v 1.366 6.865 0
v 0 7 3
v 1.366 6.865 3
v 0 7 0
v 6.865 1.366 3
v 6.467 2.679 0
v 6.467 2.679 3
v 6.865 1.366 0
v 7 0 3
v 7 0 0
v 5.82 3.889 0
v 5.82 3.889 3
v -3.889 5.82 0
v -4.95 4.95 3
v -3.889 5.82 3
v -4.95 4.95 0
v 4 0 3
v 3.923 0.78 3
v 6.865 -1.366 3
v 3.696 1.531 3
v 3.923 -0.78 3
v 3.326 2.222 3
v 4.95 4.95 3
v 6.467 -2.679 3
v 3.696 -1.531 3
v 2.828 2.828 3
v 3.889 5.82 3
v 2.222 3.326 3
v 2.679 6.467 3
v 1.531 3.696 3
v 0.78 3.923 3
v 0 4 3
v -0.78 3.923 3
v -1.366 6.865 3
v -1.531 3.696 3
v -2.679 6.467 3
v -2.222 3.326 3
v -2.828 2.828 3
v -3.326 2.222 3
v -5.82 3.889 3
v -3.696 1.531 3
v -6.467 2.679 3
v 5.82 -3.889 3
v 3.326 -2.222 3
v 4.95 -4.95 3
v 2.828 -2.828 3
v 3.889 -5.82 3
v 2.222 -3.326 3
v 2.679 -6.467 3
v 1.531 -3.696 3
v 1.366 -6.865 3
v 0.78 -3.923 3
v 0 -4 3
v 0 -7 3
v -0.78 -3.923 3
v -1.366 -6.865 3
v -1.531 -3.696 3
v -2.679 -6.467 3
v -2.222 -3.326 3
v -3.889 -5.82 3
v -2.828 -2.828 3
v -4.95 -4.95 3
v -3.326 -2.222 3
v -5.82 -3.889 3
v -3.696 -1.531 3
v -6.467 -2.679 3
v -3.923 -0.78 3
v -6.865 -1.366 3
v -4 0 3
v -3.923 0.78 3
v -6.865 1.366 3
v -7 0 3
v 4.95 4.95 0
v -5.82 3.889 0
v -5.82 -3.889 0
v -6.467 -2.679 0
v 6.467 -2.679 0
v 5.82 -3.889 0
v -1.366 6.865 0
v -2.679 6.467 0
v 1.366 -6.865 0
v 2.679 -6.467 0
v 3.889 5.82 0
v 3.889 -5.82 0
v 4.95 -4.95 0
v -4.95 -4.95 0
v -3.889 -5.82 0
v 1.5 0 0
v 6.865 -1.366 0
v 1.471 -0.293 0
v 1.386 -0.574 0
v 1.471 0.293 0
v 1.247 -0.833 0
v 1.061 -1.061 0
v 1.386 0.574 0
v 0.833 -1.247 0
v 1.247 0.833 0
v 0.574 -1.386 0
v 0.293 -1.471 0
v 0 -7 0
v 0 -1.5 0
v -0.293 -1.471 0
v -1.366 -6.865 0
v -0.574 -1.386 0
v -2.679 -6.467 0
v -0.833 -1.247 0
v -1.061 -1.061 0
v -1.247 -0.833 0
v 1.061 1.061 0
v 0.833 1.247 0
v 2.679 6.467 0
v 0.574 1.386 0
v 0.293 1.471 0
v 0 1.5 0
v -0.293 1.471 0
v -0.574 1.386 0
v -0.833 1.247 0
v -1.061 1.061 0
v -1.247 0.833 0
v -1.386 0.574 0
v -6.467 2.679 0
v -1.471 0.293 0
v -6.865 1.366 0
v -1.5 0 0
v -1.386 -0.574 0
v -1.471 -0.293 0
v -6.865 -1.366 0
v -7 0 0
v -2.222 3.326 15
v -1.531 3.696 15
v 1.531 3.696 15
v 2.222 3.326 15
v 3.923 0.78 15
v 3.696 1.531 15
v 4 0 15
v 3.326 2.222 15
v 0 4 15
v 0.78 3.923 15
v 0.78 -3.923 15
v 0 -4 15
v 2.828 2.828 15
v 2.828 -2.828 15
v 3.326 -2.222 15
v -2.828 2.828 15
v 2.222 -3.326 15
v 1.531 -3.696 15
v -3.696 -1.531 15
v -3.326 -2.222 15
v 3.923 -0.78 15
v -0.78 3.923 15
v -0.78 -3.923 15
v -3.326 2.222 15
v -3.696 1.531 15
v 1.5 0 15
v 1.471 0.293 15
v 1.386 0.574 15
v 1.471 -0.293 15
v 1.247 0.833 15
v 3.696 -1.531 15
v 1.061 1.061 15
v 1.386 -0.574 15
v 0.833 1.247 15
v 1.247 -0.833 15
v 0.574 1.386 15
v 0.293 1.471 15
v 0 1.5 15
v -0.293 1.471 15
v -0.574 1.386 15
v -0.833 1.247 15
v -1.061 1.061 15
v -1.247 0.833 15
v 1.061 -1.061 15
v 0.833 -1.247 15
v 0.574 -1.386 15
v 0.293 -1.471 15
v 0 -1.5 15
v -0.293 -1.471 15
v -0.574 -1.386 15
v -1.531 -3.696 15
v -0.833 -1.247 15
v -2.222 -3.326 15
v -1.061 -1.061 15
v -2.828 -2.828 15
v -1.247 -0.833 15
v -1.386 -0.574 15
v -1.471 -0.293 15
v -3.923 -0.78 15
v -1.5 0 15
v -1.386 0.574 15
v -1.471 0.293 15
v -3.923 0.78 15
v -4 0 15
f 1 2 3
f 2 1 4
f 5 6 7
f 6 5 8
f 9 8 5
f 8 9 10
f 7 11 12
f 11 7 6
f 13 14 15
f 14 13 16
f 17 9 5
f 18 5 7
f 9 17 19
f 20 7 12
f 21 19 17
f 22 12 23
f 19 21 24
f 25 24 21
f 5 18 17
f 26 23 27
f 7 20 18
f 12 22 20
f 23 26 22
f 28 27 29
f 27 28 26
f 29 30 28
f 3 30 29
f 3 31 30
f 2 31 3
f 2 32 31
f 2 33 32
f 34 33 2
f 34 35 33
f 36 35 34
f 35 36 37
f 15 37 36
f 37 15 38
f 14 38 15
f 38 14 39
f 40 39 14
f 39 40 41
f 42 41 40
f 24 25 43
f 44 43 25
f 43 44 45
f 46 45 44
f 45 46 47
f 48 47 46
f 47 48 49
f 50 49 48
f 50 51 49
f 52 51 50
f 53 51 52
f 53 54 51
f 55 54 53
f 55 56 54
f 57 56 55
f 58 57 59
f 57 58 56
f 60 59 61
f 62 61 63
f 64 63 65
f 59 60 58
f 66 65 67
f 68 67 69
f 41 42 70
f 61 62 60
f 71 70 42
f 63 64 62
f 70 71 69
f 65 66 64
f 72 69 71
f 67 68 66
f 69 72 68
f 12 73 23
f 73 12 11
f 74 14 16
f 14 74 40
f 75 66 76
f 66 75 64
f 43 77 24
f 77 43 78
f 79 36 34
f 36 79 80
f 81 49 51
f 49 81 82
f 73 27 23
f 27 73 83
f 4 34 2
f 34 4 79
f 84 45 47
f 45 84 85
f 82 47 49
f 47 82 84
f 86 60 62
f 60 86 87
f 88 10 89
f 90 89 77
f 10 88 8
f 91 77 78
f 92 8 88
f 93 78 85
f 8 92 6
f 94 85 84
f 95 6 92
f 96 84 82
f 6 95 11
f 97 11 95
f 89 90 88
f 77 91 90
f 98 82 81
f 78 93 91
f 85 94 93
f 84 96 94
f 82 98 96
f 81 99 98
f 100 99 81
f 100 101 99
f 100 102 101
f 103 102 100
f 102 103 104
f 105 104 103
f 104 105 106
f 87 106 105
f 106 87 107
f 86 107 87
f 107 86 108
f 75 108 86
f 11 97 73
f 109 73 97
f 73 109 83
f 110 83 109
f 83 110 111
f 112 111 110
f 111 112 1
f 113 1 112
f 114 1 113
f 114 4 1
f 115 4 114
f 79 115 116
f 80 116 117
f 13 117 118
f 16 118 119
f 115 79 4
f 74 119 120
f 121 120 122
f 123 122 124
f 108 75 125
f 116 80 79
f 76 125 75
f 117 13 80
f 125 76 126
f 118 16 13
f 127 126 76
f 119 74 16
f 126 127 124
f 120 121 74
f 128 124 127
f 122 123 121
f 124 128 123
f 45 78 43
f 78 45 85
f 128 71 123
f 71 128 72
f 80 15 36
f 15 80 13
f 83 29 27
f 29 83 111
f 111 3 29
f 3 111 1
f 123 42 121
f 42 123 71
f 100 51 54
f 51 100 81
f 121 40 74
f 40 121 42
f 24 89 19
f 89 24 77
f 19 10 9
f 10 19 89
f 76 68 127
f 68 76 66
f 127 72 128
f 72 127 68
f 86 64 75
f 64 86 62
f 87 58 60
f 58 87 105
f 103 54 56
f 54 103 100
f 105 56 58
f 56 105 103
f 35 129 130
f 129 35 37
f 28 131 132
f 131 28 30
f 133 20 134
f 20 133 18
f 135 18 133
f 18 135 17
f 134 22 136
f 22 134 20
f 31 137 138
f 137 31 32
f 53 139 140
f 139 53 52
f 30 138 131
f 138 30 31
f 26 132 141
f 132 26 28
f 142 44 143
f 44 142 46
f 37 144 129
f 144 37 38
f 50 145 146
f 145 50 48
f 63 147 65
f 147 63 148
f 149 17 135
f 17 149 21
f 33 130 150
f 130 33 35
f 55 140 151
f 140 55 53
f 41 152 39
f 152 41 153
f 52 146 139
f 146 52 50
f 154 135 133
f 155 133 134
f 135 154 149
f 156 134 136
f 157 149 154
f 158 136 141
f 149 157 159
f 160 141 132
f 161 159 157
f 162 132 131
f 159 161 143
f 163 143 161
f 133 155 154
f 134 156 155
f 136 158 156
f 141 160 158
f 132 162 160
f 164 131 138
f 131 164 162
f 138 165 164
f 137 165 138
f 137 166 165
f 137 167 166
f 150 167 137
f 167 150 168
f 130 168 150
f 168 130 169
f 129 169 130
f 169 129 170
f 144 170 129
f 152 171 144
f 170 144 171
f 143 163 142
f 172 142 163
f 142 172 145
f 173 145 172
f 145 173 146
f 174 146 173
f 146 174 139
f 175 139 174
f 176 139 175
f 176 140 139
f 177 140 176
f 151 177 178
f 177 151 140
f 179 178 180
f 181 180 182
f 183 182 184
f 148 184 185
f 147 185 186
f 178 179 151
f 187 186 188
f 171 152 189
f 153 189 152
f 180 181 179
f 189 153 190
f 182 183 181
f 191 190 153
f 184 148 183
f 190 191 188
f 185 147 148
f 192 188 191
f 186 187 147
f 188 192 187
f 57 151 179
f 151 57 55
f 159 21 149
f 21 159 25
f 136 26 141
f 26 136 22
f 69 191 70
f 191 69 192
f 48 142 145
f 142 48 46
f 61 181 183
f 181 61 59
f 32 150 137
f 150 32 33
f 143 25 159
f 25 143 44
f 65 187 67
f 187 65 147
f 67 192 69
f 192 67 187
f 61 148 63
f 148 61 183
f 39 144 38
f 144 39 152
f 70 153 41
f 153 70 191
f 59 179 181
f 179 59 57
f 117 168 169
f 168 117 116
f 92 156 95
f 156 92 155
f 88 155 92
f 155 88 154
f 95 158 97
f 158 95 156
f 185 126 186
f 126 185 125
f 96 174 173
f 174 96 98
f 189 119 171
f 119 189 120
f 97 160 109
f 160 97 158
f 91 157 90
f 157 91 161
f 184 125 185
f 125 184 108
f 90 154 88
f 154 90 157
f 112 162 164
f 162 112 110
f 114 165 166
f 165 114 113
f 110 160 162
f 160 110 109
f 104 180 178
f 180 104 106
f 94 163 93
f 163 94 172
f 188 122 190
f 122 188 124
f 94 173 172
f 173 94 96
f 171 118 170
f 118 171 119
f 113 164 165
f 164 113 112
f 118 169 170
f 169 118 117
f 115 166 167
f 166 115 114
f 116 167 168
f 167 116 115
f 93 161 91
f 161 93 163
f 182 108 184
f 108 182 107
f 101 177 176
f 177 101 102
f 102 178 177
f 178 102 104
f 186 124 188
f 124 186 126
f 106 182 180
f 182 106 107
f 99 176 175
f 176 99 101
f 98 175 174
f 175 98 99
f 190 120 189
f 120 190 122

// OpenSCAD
$fn = 32;

// ----------------------------------------------------------------------
// Micro post: flanged post, 5-20 mm class
// ----------------------------------------------------------------------

// --- parameters (mm) ---
post_d = 8;               // post diameter
post_h = 12;              // post height above the flange
flange_d = 14;            // flange diameter
flange_t = 3;             // flange thickness
bore_d = 3;               // through bore

total_h = post_h + flange_t;  // overall height

difference() {
  union() {
    cylinder(h = flange_t, d = flange_d);
    translate([0, 0, flange_t]) cylinder(h = post_h, d = post_d);
  }
  translate([0, 0, -1]) cylinder(h = total_h + 2, d = bore_d);
}
